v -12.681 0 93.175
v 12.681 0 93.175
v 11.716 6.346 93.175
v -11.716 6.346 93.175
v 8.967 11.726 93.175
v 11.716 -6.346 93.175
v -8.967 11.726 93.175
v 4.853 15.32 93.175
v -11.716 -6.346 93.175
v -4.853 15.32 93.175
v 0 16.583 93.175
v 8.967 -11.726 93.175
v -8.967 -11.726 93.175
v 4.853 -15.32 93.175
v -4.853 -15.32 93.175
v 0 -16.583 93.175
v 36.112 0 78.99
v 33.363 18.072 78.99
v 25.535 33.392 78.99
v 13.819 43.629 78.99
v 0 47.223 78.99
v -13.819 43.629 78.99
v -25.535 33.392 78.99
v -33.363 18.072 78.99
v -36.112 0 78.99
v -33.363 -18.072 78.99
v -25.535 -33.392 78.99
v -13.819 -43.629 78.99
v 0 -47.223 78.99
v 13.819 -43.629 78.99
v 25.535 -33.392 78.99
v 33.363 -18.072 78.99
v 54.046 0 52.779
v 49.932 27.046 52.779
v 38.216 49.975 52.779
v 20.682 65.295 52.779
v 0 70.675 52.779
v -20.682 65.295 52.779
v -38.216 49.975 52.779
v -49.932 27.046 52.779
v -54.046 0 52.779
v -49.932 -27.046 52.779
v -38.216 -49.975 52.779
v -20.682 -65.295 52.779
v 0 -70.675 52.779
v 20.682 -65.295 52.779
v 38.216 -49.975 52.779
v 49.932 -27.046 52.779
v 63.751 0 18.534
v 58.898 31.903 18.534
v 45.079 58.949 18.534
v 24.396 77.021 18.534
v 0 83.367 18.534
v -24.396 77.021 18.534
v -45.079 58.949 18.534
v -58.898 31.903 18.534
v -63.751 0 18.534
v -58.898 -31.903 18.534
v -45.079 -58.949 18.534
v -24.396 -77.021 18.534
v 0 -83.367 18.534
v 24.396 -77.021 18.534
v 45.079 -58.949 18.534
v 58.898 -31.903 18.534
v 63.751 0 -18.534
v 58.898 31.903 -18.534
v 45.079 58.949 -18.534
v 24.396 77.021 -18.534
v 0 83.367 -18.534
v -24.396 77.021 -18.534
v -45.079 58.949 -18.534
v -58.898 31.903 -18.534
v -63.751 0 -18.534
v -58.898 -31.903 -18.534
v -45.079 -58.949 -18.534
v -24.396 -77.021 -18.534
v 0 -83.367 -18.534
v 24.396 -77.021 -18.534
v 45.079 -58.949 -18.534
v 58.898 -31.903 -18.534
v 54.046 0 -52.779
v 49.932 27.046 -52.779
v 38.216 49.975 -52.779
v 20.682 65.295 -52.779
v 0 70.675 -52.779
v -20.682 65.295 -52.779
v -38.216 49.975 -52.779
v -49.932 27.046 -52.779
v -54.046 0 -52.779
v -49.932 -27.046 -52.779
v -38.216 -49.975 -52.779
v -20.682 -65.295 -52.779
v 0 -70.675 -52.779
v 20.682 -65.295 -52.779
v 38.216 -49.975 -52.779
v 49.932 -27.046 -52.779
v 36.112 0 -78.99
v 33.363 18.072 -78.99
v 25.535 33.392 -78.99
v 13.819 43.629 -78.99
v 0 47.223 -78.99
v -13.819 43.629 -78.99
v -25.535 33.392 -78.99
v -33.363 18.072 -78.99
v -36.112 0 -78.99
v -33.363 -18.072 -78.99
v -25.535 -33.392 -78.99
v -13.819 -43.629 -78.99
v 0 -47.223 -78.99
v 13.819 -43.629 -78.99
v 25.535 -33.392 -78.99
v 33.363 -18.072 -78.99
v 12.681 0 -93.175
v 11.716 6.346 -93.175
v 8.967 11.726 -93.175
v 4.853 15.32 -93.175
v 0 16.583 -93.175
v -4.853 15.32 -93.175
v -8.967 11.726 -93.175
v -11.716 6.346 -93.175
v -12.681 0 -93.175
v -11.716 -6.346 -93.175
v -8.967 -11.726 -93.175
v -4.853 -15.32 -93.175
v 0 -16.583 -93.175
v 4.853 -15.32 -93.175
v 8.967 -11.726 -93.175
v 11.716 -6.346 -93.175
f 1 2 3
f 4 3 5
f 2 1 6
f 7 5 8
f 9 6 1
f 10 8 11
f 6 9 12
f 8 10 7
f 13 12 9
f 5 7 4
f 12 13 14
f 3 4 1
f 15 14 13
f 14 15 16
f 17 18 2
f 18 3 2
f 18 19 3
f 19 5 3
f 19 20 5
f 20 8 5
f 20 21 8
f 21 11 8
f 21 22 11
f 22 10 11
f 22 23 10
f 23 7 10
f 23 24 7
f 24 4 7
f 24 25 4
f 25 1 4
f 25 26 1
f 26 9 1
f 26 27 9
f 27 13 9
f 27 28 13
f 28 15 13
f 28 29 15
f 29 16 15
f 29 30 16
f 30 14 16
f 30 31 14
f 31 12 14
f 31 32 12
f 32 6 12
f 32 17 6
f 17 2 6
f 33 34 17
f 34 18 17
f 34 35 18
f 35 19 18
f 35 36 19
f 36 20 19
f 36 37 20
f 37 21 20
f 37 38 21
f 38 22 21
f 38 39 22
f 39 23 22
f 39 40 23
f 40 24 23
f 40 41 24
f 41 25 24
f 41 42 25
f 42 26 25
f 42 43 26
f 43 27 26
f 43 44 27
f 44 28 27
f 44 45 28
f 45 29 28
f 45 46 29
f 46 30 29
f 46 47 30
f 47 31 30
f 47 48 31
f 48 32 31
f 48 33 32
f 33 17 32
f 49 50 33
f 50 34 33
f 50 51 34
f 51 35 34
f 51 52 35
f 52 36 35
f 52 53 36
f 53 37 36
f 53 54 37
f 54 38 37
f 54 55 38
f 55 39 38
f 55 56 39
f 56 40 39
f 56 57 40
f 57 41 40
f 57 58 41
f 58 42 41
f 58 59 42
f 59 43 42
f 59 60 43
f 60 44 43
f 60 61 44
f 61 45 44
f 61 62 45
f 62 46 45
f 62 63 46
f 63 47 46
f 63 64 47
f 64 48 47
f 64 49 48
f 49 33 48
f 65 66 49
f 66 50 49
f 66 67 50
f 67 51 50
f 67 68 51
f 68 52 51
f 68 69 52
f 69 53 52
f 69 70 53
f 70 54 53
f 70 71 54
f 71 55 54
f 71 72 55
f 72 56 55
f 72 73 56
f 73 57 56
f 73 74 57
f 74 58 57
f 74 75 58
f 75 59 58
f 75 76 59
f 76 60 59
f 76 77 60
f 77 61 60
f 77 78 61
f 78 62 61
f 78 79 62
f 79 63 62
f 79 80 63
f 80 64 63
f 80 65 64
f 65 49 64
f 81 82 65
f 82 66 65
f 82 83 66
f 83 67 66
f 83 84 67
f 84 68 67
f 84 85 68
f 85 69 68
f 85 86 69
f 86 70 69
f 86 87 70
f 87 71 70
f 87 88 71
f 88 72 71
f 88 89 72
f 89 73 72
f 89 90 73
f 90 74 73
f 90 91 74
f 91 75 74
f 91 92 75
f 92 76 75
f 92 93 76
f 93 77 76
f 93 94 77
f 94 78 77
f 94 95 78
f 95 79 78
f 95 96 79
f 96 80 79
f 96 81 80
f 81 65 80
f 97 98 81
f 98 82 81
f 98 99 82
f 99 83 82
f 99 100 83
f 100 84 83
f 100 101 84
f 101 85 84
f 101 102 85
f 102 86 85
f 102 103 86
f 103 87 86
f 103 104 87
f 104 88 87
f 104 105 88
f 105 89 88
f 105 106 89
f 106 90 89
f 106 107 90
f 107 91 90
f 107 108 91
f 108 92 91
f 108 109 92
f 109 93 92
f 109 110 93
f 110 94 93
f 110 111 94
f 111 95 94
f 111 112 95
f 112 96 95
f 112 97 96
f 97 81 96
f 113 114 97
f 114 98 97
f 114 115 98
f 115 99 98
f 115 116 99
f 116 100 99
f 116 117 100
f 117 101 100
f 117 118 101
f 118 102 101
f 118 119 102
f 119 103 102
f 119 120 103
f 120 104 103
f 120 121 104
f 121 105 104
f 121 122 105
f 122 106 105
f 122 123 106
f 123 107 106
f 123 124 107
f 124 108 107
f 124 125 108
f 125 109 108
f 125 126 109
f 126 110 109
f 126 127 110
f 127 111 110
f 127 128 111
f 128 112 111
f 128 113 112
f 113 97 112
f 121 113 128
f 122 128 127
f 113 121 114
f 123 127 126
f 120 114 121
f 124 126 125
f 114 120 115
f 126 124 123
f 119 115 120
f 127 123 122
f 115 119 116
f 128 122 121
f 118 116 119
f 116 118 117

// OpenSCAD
// Generated by SolidPython 1.0.1 on 2020-07-29 00:46:51


scale(v = [13, 17, 19]) {
	sphere(r = 5);
}
/***********************************************
*********      SolidPython code:      **********
************************************************
 
# import packages: SolidPython
from solid import *
from solid.utils import *
from itertools import chain, combinations, permutations


class Resize:

    def __init__(self, scad_file):
        self.scad_file = scad_file
        #self.scad_file = import_scad(scad_file)
        # cone/cylinder param:
        self.r1 = 0
        self.r2 = 0
        self.h = 0
        # rectangular prism param:
        self.w = 0
        self.l = 0
        # ellipse param:
        self.r = 0

    # import OpenScad code (file name corresponds to shape)


    # classify shape + parameters
    def assign(self, param1, param2, param3):
        if self.scad_file == 'cone.scad':
            self.r1 = param1
            self.r2 = param2
            self.h = param3
        elif self.scad_file == 'cylinder.scad':
            self.r1 = param1
            self.r2 = param2
            self.h = param3
        elif self.scad_file == 'rectangularPrism.scad':
            self.h = param1
            self.l = param2
            self.w = param3
        else:
            self.r = param1
            self.h = param2

    # resize parameters
    def iterate(self):
        x = range(3, 20, 2)
        i = 1
        if self.scad_file == 'cone.scad':
            tempList = list(permutations(x, 2))
            for temp in tempList:
                param1 = temp[0]
                param2 = temp[1]
                filepath = 'produced_scad_files/' + 'cone' + str(param1) + '_' + str(param2) + '_' + '.scad'
                scad_render_to_file(cylinder(h=param1, r1=param2, r2=0), filepath)

        elif self.scad_file == 'cylinder.scad':
            tempList = list(permutations(x, 3))
            for temp in tempList:
                param1 = temp[0]
                param2 = temp[1]
                filepath = 'produced_scad_files/' + 'cylinder' + str(param1) + '_' + str(param2) + '_' + '.scad'
                scad_render_to_file(cylinder(h=param1, r1=param2, r2=param2), filepath)

        elif self.scad_file == 'rectangularPrism.scad':
            tempList = list(permutations(x, 3))
            for temp in tempList:
                param1 = temp[0]
                param2 = temp[1]
                param3 = temp[2]
                filepath = 'produced_scad_files/' + 'rectangularPrism' + str(param1) + '_' + str(param2) + '_' + str(
                    param3) + '.scad'
                scad_render_to_file(cube(size=(param1, param2, param3)), filepath)

        elif self.scad_file == 'ellipse.scad':
            tempList = list(permutations(x, 4))
            for temp in tempList:
                param1 = temp[0]
                param2 = temp[1]
                param3 = temp[2]
                param4 = temp[3]
                filepath = 'produced_scad_files/' + 'ellipse' + str(param1) + '_' + str(param2) + '_' + str(param3) + '_' + str(param4) + '.scad'
                scad_render_to_file(scale([param1, param2, param3])(sphere(r=param4)), filepath)

    def render_to_scadfile(self):
        scad_render_to_file(scad, 'example.scad') 
 
************************************************/
